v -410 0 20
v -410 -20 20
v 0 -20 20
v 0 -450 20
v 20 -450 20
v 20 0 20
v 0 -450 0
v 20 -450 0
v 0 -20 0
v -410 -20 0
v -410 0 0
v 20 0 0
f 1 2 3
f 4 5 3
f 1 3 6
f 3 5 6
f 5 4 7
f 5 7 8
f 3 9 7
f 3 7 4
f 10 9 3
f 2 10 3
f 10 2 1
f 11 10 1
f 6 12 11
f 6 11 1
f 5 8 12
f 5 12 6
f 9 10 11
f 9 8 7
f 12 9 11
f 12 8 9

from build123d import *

# Parameters (mm, degrees)
F0_W     = 20
F0_H     = 20
F1_DEPTH = 450
F2_W     = 20
F2_H     = 20
F3_DEPTH = 410


with BuildPart() as f1:
    # F0 (on Front) → F1 (new body)
    with BuildSketch(Plane.XZ):
        with Locations((10, 10)):
            Rectangle(F0_W, F0_H)
    extrude(amount=F1_DEPTH)

    # F2 (on Right) → F3 (join)
    with BuildSketch(Plane.YZ):
        with Locations((-10, 10)):
            Rectangle(F2_W, F2_H)
    extrude(amount=-F3_DEPTH)


solid = f1.part
